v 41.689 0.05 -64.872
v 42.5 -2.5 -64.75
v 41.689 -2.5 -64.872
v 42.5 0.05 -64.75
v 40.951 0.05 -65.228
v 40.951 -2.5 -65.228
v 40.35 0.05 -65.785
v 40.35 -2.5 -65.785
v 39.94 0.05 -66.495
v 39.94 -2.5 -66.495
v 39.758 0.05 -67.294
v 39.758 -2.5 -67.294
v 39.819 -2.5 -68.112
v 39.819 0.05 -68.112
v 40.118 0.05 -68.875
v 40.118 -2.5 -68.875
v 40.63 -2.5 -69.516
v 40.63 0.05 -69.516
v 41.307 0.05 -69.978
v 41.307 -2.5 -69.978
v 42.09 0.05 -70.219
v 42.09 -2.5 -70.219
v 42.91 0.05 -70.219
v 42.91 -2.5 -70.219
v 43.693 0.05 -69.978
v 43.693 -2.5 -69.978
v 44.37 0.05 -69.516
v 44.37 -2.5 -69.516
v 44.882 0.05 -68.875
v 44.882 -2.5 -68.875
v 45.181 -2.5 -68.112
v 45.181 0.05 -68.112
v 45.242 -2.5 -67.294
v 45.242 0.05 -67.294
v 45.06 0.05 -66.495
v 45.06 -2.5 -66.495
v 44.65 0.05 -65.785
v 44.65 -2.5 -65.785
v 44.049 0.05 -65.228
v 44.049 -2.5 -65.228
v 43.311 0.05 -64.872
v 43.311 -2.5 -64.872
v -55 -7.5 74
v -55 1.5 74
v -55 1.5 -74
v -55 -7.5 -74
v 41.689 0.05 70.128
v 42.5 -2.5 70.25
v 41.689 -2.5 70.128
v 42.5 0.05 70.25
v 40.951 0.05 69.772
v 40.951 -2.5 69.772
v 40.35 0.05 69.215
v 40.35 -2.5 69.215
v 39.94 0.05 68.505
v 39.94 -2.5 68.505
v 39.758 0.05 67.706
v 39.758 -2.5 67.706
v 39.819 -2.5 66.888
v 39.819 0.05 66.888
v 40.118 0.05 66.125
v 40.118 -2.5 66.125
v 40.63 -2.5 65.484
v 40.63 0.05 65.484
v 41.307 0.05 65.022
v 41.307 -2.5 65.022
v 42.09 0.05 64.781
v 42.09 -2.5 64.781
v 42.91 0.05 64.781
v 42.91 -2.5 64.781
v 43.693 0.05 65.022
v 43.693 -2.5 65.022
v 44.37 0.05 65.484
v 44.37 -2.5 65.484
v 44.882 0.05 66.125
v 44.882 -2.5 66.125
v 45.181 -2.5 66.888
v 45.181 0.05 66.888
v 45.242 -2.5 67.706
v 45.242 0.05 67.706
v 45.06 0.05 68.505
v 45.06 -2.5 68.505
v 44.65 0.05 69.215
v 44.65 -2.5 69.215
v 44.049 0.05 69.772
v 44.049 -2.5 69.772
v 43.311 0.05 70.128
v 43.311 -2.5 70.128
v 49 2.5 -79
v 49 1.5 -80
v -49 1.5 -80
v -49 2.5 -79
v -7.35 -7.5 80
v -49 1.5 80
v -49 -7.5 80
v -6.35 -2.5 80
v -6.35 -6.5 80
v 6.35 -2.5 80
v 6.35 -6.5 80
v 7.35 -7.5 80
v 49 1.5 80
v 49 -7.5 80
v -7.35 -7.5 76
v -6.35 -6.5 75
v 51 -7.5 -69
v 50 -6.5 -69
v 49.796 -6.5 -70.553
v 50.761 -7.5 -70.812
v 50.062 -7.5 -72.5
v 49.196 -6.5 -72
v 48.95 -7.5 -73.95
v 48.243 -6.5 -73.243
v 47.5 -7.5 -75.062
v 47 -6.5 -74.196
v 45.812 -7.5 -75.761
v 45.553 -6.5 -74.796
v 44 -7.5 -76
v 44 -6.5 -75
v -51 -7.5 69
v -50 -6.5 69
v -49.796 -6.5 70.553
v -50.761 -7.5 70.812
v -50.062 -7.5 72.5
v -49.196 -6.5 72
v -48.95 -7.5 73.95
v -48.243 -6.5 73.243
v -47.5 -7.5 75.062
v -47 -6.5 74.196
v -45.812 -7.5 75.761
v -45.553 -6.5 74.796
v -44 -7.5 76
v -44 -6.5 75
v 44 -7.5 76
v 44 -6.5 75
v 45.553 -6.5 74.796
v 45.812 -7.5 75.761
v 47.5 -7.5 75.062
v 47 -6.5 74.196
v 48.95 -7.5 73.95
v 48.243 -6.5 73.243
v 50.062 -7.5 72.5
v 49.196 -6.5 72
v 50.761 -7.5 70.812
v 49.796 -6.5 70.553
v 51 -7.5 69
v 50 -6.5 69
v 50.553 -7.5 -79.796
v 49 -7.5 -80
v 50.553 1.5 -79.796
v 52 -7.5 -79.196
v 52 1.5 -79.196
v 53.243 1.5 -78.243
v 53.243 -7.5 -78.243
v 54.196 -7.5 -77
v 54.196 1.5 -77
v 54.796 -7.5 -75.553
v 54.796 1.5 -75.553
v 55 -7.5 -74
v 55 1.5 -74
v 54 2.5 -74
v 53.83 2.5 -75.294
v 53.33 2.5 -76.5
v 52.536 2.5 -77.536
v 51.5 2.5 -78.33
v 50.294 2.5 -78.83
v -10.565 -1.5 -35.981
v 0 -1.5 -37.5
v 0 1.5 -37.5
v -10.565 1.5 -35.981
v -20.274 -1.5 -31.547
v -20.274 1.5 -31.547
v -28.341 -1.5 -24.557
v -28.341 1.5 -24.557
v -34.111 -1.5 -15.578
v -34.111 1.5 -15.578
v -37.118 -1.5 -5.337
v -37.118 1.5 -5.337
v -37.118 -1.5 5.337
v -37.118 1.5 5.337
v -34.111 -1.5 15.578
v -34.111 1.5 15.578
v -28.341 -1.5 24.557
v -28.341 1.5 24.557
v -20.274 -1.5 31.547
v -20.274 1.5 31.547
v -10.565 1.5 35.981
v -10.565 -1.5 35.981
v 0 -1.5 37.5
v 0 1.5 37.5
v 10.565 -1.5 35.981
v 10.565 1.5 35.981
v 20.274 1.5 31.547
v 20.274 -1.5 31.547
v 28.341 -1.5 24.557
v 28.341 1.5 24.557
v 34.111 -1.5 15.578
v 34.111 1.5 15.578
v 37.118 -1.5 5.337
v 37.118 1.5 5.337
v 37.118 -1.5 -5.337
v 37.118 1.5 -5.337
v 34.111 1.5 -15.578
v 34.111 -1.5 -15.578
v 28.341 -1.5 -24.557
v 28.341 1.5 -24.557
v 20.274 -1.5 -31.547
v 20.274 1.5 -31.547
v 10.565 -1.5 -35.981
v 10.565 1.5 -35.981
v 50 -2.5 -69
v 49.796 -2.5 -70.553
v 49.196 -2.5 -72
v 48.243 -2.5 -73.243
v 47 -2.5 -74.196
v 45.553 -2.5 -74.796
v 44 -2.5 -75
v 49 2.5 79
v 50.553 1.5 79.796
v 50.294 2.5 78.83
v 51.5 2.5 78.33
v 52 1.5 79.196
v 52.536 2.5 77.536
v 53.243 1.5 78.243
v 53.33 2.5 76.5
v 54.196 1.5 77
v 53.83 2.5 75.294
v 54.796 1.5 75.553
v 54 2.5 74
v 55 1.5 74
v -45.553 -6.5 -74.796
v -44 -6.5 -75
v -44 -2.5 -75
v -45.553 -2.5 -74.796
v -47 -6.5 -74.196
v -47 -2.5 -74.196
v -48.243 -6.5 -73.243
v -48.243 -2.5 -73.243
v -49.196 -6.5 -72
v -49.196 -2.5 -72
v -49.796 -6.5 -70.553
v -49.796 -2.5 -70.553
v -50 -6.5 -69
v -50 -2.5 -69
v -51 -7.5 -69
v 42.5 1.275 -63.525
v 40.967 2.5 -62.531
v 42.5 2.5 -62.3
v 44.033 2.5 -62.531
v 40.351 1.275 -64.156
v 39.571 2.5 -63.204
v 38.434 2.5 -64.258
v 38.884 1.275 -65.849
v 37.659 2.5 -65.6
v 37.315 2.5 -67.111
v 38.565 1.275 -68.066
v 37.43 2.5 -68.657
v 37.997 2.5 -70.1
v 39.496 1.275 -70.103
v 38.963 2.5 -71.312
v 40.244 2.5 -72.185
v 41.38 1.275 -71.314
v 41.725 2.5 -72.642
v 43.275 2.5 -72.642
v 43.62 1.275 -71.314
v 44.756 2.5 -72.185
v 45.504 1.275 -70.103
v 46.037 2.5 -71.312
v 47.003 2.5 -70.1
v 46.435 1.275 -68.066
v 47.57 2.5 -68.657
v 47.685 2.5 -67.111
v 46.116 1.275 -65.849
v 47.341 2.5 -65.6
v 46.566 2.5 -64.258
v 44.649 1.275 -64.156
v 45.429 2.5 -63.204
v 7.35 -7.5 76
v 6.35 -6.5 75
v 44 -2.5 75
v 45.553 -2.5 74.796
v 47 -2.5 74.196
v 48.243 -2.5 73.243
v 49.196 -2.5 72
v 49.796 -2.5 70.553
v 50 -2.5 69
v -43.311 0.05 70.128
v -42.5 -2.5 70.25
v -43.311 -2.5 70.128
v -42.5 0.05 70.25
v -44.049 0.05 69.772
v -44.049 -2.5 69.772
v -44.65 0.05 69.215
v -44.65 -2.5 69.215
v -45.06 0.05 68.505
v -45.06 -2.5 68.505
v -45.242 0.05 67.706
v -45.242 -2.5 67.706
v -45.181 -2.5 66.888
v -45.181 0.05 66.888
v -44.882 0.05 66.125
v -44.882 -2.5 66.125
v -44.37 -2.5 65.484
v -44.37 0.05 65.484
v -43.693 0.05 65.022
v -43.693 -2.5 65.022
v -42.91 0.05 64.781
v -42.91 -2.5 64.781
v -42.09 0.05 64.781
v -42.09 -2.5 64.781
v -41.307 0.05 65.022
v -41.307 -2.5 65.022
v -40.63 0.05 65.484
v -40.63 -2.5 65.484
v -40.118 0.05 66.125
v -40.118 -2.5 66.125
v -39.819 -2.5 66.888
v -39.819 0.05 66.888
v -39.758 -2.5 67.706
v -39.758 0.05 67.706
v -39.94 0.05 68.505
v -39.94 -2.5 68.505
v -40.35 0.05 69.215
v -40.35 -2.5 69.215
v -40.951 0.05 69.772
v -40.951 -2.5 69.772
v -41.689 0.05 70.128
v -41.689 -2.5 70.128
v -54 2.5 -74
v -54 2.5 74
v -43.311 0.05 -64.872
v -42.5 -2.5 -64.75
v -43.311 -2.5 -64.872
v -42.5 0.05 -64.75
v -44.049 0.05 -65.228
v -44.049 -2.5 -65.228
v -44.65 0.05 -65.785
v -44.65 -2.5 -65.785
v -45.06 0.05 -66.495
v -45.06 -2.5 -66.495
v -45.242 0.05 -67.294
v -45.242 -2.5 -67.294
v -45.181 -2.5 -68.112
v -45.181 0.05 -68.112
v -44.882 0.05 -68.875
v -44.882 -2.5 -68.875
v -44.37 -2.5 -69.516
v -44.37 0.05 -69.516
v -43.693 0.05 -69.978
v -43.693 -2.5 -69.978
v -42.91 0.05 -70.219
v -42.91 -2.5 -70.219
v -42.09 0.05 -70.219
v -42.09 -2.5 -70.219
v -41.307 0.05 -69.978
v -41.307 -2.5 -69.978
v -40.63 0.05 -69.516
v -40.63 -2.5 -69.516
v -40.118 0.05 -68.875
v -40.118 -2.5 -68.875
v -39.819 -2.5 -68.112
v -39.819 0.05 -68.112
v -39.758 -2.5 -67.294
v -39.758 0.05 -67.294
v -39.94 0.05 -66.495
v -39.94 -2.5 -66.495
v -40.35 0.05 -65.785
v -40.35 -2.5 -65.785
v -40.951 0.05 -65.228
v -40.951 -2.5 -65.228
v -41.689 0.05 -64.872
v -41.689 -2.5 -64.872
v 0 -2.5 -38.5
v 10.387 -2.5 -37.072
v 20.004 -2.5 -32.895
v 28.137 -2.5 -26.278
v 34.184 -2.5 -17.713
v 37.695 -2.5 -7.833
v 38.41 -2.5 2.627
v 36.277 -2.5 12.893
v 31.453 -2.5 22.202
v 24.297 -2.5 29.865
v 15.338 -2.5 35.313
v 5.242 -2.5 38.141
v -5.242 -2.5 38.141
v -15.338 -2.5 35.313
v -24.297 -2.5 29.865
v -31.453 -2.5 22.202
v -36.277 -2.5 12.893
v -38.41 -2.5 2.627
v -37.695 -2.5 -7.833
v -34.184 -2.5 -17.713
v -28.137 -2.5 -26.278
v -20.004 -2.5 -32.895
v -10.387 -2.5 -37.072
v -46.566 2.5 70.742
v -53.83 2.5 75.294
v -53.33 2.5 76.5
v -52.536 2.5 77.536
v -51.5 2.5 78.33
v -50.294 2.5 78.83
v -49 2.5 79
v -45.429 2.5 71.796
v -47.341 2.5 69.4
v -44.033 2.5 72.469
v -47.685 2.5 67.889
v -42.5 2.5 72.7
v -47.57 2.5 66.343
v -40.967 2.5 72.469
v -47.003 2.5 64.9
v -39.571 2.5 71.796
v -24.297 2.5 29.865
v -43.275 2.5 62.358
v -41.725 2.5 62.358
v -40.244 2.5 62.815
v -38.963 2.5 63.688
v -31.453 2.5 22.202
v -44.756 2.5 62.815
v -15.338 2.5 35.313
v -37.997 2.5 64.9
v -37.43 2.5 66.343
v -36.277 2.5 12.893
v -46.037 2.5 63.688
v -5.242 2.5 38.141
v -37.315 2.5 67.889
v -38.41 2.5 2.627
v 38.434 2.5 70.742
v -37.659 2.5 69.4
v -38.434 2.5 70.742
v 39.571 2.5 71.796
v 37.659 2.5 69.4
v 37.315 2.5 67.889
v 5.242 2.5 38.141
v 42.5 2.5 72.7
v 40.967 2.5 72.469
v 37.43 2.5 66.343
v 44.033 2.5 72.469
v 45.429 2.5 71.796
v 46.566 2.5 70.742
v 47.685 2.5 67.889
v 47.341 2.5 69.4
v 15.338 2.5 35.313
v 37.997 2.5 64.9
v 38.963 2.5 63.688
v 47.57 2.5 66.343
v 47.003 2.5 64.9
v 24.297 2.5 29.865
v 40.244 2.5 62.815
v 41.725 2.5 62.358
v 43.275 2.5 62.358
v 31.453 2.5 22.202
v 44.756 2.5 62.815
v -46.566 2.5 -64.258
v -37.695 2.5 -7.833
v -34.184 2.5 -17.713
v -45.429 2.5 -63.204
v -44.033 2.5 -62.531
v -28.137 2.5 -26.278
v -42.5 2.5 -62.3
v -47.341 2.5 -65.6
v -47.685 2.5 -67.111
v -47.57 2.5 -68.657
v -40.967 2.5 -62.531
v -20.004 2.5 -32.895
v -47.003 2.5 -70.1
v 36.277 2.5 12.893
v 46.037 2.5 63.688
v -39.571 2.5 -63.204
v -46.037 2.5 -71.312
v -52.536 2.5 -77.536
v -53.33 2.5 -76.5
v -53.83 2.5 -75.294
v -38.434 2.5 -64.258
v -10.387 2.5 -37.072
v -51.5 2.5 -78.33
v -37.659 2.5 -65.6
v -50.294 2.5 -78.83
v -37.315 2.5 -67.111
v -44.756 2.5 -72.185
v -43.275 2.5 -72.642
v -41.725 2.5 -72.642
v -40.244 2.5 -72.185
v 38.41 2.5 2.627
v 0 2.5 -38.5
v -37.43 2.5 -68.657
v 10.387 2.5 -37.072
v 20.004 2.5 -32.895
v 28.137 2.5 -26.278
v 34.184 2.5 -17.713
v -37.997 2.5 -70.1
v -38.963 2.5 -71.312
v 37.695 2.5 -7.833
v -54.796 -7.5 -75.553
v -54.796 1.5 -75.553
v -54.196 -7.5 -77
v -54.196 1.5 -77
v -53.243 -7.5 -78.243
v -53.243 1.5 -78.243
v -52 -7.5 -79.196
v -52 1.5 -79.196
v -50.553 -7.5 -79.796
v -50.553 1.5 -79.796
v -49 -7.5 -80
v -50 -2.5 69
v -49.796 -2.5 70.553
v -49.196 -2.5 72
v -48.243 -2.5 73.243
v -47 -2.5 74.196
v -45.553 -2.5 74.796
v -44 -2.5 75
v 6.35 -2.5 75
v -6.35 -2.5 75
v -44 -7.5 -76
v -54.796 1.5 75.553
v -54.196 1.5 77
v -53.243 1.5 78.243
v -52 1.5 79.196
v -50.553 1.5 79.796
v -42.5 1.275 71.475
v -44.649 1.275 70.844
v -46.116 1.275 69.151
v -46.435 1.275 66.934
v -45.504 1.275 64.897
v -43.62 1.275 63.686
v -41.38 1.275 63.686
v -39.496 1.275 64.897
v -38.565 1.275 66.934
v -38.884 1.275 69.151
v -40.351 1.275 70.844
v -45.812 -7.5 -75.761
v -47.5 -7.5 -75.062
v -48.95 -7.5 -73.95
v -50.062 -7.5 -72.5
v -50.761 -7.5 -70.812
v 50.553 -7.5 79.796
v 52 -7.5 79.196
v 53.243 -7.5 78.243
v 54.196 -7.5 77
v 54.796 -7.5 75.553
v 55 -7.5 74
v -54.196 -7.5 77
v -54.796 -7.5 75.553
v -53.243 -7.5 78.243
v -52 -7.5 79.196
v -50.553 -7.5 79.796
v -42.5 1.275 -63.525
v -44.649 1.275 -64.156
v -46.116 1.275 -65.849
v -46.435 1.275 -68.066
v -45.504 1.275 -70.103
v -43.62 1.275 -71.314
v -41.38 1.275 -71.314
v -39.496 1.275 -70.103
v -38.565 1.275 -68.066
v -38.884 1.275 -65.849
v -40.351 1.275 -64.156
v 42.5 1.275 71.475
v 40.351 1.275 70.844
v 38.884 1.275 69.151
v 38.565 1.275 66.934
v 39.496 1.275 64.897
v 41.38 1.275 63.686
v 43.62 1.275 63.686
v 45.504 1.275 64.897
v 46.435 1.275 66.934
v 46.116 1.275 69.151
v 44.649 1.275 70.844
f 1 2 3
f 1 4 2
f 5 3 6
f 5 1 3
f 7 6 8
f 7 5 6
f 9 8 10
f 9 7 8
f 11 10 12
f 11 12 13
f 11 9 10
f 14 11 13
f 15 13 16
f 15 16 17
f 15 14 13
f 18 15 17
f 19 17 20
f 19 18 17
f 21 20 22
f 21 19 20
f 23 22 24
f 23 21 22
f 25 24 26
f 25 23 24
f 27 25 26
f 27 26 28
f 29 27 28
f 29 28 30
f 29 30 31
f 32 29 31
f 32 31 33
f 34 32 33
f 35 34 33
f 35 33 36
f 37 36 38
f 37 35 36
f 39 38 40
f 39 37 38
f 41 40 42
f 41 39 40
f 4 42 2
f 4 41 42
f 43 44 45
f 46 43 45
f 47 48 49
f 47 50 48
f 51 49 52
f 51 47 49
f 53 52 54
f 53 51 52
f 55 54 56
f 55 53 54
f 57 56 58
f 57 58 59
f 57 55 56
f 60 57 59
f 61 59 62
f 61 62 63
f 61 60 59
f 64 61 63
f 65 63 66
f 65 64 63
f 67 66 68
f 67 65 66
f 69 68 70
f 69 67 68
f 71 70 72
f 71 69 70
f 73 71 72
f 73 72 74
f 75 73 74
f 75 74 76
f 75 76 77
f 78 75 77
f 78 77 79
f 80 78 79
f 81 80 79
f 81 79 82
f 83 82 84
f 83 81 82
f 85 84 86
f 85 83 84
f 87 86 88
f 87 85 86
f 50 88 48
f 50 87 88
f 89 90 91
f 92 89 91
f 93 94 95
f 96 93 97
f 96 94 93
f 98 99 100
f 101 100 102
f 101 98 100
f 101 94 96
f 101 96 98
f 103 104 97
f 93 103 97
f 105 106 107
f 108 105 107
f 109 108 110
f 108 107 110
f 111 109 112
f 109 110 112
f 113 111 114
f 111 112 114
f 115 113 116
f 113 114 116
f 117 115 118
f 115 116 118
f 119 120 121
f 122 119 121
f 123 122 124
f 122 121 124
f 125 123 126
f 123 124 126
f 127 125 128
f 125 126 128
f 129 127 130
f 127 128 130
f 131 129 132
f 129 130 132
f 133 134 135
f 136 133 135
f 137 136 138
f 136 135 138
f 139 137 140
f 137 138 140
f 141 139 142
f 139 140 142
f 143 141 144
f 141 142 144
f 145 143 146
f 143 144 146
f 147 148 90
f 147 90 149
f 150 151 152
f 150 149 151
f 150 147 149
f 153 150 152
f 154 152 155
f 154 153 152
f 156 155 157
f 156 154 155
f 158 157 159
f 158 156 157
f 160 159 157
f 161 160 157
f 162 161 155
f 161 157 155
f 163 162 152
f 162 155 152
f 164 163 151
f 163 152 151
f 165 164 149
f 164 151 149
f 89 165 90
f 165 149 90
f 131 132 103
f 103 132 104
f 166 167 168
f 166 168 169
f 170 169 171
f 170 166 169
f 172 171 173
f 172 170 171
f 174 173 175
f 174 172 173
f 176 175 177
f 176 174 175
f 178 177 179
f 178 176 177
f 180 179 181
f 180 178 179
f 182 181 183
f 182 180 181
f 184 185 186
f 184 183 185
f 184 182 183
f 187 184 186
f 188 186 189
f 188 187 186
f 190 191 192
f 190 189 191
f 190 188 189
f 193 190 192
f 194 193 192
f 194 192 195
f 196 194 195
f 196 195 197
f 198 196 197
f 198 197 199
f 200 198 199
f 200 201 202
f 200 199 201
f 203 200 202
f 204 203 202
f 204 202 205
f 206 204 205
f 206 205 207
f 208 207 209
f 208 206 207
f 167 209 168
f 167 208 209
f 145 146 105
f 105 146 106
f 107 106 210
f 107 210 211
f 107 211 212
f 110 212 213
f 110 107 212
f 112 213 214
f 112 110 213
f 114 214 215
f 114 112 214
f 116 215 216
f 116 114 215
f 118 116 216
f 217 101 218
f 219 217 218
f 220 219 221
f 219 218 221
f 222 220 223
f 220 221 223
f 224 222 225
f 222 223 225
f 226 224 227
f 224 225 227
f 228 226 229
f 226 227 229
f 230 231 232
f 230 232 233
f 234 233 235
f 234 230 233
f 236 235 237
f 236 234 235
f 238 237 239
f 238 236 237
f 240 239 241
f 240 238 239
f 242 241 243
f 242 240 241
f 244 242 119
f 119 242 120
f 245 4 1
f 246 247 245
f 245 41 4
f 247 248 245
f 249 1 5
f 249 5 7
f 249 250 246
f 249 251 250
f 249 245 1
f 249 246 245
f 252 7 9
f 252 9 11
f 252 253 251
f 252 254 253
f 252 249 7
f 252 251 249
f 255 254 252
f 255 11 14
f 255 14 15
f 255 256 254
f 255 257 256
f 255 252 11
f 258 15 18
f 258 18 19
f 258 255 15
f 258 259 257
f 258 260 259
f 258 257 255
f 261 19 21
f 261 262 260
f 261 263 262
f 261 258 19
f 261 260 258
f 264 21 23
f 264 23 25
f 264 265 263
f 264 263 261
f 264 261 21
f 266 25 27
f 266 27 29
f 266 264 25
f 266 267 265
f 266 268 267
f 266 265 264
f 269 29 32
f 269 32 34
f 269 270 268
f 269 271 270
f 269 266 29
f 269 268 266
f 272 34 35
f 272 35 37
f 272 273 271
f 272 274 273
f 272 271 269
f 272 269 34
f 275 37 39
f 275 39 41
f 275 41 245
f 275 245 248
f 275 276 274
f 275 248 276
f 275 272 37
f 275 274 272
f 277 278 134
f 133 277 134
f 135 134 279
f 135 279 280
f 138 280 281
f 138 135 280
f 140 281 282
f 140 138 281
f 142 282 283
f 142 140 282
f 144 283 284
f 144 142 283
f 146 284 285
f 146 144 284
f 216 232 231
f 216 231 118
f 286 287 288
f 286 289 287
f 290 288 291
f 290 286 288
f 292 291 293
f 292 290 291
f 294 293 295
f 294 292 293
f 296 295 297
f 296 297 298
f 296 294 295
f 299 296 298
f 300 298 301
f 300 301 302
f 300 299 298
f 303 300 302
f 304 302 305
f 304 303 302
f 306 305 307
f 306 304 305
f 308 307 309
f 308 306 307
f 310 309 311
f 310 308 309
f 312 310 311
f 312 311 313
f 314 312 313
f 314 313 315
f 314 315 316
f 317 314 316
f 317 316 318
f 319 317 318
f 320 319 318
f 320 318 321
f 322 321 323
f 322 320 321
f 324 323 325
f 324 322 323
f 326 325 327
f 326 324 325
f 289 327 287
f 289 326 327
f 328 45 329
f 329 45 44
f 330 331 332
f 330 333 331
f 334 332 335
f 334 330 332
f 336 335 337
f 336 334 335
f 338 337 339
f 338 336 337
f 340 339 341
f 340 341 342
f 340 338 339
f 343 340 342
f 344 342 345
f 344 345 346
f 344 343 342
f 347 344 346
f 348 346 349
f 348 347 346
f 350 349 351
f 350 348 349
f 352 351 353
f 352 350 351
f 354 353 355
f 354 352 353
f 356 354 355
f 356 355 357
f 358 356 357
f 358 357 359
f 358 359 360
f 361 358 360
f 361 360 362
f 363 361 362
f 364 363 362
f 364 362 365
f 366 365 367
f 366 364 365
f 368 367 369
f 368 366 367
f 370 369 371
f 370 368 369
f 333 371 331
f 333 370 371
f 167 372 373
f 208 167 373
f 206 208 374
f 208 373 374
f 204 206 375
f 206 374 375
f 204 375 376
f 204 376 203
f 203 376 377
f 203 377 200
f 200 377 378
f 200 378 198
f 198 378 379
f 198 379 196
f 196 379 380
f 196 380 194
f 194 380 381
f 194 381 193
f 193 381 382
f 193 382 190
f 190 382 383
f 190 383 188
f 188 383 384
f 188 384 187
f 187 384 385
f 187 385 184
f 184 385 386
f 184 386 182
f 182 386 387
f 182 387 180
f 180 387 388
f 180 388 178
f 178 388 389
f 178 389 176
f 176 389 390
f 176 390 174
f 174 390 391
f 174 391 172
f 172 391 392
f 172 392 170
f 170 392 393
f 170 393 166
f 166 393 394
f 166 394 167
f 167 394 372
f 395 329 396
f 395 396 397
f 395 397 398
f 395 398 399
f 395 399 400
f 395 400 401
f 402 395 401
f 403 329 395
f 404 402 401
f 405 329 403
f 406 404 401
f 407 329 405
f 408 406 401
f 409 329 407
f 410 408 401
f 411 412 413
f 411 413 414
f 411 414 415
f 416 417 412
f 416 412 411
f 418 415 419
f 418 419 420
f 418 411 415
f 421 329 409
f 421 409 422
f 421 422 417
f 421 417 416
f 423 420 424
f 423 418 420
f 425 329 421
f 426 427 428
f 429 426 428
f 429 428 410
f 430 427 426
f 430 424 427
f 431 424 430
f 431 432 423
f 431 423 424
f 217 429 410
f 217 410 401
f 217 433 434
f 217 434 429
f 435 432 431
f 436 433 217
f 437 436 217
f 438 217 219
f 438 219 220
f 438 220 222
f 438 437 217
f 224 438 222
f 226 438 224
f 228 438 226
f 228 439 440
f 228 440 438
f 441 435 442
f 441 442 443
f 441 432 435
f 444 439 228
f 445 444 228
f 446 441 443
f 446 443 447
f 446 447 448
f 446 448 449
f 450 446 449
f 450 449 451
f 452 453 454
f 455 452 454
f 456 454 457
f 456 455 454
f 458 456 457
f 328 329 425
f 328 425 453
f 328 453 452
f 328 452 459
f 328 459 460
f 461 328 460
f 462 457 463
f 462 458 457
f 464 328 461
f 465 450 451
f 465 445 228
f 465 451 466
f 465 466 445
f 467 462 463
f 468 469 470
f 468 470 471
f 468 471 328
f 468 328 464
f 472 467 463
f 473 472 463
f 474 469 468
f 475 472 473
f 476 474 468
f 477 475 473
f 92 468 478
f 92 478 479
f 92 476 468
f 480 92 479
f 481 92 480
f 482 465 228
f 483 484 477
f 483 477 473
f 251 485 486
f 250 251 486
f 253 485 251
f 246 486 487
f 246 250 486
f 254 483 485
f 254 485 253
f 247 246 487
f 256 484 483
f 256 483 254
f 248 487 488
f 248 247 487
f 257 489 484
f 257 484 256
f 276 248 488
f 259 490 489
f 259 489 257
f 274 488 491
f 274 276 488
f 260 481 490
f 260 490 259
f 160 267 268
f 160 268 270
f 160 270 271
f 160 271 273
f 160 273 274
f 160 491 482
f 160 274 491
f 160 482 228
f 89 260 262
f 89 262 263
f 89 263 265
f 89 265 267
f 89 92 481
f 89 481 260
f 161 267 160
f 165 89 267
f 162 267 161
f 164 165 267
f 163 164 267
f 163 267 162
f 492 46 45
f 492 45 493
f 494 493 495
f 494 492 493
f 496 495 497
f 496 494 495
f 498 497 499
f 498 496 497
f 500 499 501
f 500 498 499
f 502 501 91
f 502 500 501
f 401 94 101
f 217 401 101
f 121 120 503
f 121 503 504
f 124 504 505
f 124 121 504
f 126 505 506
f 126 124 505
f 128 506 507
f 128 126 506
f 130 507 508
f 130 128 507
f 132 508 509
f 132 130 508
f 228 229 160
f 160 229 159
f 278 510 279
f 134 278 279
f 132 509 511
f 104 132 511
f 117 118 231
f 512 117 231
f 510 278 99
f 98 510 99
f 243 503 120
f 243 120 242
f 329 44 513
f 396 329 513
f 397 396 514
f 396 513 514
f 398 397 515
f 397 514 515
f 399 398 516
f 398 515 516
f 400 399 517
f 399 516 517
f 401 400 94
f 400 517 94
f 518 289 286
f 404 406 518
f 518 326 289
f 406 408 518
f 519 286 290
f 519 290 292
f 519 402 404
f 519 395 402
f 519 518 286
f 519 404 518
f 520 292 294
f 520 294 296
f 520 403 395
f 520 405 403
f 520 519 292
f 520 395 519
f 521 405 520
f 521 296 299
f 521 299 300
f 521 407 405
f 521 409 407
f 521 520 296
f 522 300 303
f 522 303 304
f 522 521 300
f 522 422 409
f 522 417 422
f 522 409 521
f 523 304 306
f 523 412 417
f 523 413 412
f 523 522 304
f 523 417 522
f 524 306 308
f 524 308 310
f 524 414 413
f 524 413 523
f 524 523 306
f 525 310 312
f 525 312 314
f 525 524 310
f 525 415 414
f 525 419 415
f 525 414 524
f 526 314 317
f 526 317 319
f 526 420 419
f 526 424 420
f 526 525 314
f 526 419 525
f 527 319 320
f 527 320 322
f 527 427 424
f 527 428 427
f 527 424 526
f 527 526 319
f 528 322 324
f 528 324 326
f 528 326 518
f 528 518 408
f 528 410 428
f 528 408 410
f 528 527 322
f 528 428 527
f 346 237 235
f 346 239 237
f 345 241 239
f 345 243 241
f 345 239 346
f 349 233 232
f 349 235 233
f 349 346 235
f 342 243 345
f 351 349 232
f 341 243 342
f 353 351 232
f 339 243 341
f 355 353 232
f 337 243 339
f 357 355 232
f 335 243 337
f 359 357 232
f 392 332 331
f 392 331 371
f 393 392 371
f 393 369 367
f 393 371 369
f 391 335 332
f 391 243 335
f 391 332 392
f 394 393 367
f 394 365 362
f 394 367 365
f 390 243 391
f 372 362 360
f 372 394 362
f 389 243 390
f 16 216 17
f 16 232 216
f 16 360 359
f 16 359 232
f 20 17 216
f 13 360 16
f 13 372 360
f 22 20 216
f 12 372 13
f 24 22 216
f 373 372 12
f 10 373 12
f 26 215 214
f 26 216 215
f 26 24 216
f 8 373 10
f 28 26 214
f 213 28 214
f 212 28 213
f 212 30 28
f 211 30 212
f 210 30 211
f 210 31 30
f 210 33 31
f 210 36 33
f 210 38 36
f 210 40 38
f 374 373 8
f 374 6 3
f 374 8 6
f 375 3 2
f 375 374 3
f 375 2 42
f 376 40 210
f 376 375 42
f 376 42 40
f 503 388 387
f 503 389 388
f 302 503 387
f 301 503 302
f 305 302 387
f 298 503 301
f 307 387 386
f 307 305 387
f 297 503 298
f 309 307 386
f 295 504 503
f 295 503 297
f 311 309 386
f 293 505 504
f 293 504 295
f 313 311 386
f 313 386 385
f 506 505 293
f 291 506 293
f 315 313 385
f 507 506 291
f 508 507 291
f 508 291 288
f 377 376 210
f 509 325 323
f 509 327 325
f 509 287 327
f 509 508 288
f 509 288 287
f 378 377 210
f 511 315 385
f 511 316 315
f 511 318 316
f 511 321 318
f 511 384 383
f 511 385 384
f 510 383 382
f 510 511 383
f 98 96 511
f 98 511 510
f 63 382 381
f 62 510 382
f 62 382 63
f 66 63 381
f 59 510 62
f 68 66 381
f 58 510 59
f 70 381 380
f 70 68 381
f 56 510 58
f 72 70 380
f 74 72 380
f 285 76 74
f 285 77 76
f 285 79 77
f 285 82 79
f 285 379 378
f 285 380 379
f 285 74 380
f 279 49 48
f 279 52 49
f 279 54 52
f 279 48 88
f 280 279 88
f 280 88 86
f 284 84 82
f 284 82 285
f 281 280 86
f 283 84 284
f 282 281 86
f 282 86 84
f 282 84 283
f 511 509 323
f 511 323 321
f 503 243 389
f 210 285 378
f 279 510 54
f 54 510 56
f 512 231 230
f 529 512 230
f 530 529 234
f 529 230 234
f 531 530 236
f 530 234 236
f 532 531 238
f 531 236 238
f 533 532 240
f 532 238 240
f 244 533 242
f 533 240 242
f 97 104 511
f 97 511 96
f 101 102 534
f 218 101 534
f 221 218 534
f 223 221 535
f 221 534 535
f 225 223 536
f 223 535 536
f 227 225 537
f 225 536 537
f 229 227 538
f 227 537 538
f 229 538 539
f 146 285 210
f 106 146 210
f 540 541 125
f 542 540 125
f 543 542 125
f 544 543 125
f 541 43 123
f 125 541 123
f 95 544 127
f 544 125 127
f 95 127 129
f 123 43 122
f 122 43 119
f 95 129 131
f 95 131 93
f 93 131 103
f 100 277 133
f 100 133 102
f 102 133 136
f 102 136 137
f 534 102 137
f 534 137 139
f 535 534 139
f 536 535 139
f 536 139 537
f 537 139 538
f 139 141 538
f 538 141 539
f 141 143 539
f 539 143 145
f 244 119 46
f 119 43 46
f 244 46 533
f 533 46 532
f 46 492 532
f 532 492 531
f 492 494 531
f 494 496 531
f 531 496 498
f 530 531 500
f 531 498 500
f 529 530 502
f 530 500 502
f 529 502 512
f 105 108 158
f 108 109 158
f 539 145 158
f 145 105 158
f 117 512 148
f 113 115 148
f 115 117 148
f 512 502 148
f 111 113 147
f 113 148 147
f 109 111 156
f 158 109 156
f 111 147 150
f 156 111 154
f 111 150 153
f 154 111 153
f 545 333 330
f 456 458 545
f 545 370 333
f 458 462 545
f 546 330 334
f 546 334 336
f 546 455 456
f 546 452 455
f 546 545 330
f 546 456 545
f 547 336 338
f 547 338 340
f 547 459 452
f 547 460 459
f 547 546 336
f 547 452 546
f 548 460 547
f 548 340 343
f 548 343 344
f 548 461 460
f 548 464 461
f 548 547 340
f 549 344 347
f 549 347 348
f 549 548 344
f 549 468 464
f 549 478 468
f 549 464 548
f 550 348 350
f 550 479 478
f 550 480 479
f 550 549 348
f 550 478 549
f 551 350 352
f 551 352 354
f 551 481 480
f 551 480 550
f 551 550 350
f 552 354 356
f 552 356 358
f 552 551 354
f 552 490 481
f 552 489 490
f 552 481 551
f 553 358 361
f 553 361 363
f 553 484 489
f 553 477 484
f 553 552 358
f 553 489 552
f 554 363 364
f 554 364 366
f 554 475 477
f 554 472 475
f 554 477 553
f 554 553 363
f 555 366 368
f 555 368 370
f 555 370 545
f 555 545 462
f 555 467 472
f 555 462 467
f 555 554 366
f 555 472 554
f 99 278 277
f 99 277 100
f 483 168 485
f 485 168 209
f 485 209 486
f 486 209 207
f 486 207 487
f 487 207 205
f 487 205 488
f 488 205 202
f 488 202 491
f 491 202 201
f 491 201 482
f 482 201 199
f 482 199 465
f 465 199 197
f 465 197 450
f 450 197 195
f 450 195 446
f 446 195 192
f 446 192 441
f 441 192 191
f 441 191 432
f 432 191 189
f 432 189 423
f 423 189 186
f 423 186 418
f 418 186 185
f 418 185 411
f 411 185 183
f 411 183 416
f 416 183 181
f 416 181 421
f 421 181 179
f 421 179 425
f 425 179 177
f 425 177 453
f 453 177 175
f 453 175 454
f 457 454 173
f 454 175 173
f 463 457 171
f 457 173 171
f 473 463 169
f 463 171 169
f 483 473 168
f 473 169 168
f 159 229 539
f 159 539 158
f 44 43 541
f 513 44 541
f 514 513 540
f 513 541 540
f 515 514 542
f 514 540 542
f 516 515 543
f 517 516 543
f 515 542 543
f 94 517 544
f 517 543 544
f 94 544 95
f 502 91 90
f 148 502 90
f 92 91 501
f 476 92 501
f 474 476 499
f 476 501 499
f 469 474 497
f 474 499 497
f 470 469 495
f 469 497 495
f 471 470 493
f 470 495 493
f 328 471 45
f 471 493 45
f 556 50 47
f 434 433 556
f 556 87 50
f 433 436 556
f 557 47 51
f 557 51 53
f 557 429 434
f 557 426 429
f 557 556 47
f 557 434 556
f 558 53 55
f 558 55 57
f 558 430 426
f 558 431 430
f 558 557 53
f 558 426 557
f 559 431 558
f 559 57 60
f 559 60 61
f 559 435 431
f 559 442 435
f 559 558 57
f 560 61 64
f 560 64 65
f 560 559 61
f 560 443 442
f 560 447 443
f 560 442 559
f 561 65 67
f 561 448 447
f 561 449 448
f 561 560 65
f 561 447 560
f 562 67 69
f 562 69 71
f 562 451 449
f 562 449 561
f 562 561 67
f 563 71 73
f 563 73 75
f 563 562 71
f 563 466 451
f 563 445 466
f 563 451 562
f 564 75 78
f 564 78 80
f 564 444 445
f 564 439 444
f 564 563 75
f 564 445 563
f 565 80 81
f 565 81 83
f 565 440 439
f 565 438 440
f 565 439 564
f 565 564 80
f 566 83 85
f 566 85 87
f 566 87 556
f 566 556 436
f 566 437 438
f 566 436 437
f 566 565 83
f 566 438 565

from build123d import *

# Parameters (mm, degrees)
SKETCH1_W                                      = 100
SKETCH1_H                                      = 150
BOSS_EXTRUDE1_DEPTH                            = 2.5
CSK_FOR_M5_FLAT_HEAD_MACHINE_SCREW1_AT_2_COUNT = 2
CSK_FOR_M5_FLAT_HEAD_MACHINE_SCREW1_AT_2_PITCH = 85
CSK_FOR_M5_FLAT_HEAD_MACHINE_SCREW1_AT_3_COUNT = 2
CSK_FOR_M5_FLAT_HEAD_MACHINE_SCREW1_AT_3_PITCH = 159.530561335
CSK_FOR_M5_FLAT_HEAD_MACHINE_SCREW1_AT_4_COUNT = 2
CSK_FOR_M5_FLAT_HEAD_MACHINE_SCREW1_AT_4_PITCH = 135
SKETCH5_W                                      = 110
SKETCH5_H                                      = 160
SKETCH5_W_2                                    = 100
SKETCH5_H_2                                    = 150
BOSS_EXTRUDE2_DEPTH                            = 10
SKETCH6_W                                      = 12.7
SKETCH6_H                                      = 5
CUT_EXTRUDE1_DEPTH                             = 5
FILLET1_R                                      = 6
CUT_EXTRUDE2_DEPTH                             = 98.59610648
CUT_EXTRUDE2_DEPTH_BACK                        = 98.59610648
SKETCH7_R                                      = 37.5
CHAMFER2_SIZE                                  = 1


with BuildPart() as part:
    # Sketch1 → Boss-Extrude1 (new, symmetric)
    with BuildSketch(Plane(origin=(0, 0, 0), x_dir=(1, 0, 0), z_dir=(0, 1, 0))):
        Rectangle(SKETCH1_W, SKETCH1_H)
    extrude(amount=BOSS_EXTRUDE1_DEPTH, both=True)

    # Sketch4 → CSK for M5 Flat Head Machine Screw1 (revolve, cut)
    with BuildSketch(Plane(origin=(-42.5, 2.5, -67.5), x_dir=(0, 0, 1), z_dir=(1, 0, 0))):
        Polygon((0, 0), (0, 5), (2.75, 5), (2.75, 2.45), (5.2, 0), align=None)
    csk_for_m5_flat_head_machine_screw1 = revolve(axis=Axis((-42.5, 8.85, -67.5), (0, -1, 0)), mode=Mode.SUBTRACT)

    # CSK for M5 Flat Head Machine Screw1 at 2: CSK for M5 Flat Head Machine Screw1 ×2
    with Locations(*[(i * CSK_FOR_M5_FLAT_HEAD_MACHINE_SCREW1_AT_2_PITCH, 0, 0) for i in range(1, CSK_FOR_M5_FLAT_HEAD_MACHINE_SCREW1_AT_2_COUNT)]):
        add(csk_for_m5_flat_head_machine_screw1, mode=Mode.SUBTRACT)

    # CSK for M5 Flat Head Machine Screw1 at 3: CSK for M5 Flat Head Machine Screw1 ×2
    with Locations(*[Vector(0.5328132696861391, 0, 0.8462328400897507) * (i * CSK_FOR_M5_FLAT_HEAD_MACHINE_SCREW1_AT_3_PITCH) for i in range(1, CSK_FOR_M5_FLAT_HEAD_MACHINE_SCREW1_AT_3_COUNT)]):
        add(csk_for_m5_flat_head_machine_screw1, mode=Mode.SUBTRACT)

    # CSK for M5 Flat Head Machine Screw1 at 4: CSK for M5 Flat Head Machine Screw1 ×2
    with Locations(*[(0, 0, i * CSK_FOR_M5_FLAT_HEAD_MACHINE_SCREW1_AT_4_PITCH) for i in range(1, CSK_FOR_M5_FLAT_HEAD_MACHINE_SCREW1_AT_4_COUNT)]):
        add(csk_for_m5_flat_head_machine_screw1, mode=Mode.SUBTRACT)

    # Sketch5 → Boss-Extrude2 (add)
    with BuildSketch(Plane(origin=(0, 2.5, 0), x_dir=(1, 0, 0), z_dir=(0, 1, 0))):
        Rectangle(SKETCH5_W, SKETCH5_H)
        Rectangle(SKETCH5_W_2, SKETCH5_H_2, mode=Mode.SUBTRACT)
    extrude(amount=-BOSS_EXTRUDE2_DEPTH)

    # Sketch6 → Cut-Extrude1 (cut)
    with BuildSketch(Plane.XZ.offset(7.5)):
        with Locations((0, 77.5)):
            Rectangle(SKETCH6_W, SKETCH6_H)
    extrude(amount=-CUT_EXTRUDE1_DEPTH, mode=Mode.SUBTRACT)

    # Fillet1
    fillet1_edges = [part.edges().sort_by_distance(p)[0] for p in [
        (55, -2.5, -80),
        (55, -2.5, 80),
        (-55, -2.5, 80),
        (-55, -2.5, -80),
        (-50, -5, -75),
        (50, -5, -75),
        (50, -5, 75),
        (-50, -5, 75),
    ]]
    fillet(fillet1_edges, radius=FILLET1_R)

    # Sketch7 → Cut-Extrude2 (cut, two sides: drawn at the far end of the back side and taken through both)
    with BuildSketch(Plane(origin=(0, 2.5, 0), x_dir=(1, 0, 0), z_dir=(0, 1, 0)).offset(-CUT_EXTRUDE2_DEPTH_BACK)):
        with Locations(Location((0, 0, 0), (0, 0, 90))):
            Circle(SKETCH7_R)
    extrude(amount=CUT_EXTRUDE2_DEPTH + CUT_EXTRUDE2_DEPTH_BACK, mode=Mode.SUBTRACT)

    # Chamfer2
    chamfer2_edges = [part.edges().sort_by_distance(p)[0] for p in [
        (-48.242640687, -7.5, -73.242640687),
        (48.242640687, -7.5, -73.242640687),
        (48.242640687, -7.5, 73.242640687),
        (-48.242640687, -7.5, 73.242640687),
        (0, 2.5, 37.5),
        (0, -2.5, 37.5),
        (25.175, -7.5, 75),
        (6.35, -7.5, 77.5),
        (-6.35, -7.5, 77.5),
        (0, 2.5, 80),
        (55, 2.5, 0),
        (0, 2.5, -80),
        (-55, 2.5, 0),
        (-53.242640687, 2.5, 78.242640687),
        (-53.242640687, 2.5, -78.242640687),
        (53.242640687, 2.5, -78.242640687),
        (53.242640687, 2.5, 78.242640687),
        (50, -7.5, 0),
        (0, -7.5, -75),
        (-50, -7.5, 0),
        (-25.175, -7.5, 75),
    ]]
    chamfer(chamfer2_edges, length=CHAMFER2_SIZE)


solid = part.part
